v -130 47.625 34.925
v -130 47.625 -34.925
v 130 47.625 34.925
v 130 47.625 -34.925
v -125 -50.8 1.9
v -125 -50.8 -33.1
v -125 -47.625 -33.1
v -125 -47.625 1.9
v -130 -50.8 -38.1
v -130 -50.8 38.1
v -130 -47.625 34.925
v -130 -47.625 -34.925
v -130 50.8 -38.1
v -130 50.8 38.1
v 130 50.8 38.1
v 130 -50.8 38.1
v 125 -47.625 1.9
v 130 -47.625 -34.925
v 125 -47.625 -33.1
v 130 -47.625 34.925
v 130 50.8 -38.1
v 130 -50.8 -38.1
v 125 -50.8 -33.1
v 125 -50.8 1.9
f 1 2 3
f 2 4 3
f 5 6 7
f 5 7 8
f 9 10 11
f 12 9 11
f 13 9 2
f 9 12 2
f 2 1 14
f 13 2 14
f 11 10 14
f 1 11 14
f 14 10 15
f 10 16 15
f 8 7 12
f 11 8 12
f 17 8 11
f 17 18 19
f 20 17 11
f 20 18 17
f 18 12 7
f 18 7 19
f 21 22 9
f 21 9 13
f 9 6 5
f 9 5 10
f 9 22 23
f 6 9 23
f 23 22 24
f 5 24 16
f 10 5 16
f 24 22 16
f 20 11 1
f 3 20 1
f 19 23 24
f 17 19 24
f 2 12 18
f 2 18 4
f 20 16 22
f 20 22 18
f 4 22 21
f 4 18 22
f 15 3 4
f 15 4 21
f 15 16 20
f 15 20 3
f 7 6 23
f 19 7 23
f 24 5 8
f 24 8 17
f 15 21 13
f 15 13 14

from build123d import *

# Parameters (mm, degrees)
F0_W     = 101.6
F0_H     = 76.2
F0_W_2   = 95.25
F0_H_2   = 69.85
F1_DEPTH = 130
F2_W     = 250
F2_H     = 35
F3_DEPTH = 3.175


with BuildPart() as f1:
    # F0 (on Right) → F1 (new body, symmetric)
    with BuildSketch(Plane.YZ):
        Rectangle(F0_W, F0_H)
        Rectangle(F0_W_2, F0_H_2, mode=Mode.SUBTRACT)
    extrude(amount=F1_DEPTH, both=True)

    # F2 (on face) → F3 (cut, through all)
    with BuildSketch(Plane.XZ.offset(50.8)):
        with Locations((0, -15.6)):
            Rectangle(F2_W, F2_H)
    extrude(amount=-F3_DEPTH, mode=Mode.SUBTRACT)


solid = f1.part
